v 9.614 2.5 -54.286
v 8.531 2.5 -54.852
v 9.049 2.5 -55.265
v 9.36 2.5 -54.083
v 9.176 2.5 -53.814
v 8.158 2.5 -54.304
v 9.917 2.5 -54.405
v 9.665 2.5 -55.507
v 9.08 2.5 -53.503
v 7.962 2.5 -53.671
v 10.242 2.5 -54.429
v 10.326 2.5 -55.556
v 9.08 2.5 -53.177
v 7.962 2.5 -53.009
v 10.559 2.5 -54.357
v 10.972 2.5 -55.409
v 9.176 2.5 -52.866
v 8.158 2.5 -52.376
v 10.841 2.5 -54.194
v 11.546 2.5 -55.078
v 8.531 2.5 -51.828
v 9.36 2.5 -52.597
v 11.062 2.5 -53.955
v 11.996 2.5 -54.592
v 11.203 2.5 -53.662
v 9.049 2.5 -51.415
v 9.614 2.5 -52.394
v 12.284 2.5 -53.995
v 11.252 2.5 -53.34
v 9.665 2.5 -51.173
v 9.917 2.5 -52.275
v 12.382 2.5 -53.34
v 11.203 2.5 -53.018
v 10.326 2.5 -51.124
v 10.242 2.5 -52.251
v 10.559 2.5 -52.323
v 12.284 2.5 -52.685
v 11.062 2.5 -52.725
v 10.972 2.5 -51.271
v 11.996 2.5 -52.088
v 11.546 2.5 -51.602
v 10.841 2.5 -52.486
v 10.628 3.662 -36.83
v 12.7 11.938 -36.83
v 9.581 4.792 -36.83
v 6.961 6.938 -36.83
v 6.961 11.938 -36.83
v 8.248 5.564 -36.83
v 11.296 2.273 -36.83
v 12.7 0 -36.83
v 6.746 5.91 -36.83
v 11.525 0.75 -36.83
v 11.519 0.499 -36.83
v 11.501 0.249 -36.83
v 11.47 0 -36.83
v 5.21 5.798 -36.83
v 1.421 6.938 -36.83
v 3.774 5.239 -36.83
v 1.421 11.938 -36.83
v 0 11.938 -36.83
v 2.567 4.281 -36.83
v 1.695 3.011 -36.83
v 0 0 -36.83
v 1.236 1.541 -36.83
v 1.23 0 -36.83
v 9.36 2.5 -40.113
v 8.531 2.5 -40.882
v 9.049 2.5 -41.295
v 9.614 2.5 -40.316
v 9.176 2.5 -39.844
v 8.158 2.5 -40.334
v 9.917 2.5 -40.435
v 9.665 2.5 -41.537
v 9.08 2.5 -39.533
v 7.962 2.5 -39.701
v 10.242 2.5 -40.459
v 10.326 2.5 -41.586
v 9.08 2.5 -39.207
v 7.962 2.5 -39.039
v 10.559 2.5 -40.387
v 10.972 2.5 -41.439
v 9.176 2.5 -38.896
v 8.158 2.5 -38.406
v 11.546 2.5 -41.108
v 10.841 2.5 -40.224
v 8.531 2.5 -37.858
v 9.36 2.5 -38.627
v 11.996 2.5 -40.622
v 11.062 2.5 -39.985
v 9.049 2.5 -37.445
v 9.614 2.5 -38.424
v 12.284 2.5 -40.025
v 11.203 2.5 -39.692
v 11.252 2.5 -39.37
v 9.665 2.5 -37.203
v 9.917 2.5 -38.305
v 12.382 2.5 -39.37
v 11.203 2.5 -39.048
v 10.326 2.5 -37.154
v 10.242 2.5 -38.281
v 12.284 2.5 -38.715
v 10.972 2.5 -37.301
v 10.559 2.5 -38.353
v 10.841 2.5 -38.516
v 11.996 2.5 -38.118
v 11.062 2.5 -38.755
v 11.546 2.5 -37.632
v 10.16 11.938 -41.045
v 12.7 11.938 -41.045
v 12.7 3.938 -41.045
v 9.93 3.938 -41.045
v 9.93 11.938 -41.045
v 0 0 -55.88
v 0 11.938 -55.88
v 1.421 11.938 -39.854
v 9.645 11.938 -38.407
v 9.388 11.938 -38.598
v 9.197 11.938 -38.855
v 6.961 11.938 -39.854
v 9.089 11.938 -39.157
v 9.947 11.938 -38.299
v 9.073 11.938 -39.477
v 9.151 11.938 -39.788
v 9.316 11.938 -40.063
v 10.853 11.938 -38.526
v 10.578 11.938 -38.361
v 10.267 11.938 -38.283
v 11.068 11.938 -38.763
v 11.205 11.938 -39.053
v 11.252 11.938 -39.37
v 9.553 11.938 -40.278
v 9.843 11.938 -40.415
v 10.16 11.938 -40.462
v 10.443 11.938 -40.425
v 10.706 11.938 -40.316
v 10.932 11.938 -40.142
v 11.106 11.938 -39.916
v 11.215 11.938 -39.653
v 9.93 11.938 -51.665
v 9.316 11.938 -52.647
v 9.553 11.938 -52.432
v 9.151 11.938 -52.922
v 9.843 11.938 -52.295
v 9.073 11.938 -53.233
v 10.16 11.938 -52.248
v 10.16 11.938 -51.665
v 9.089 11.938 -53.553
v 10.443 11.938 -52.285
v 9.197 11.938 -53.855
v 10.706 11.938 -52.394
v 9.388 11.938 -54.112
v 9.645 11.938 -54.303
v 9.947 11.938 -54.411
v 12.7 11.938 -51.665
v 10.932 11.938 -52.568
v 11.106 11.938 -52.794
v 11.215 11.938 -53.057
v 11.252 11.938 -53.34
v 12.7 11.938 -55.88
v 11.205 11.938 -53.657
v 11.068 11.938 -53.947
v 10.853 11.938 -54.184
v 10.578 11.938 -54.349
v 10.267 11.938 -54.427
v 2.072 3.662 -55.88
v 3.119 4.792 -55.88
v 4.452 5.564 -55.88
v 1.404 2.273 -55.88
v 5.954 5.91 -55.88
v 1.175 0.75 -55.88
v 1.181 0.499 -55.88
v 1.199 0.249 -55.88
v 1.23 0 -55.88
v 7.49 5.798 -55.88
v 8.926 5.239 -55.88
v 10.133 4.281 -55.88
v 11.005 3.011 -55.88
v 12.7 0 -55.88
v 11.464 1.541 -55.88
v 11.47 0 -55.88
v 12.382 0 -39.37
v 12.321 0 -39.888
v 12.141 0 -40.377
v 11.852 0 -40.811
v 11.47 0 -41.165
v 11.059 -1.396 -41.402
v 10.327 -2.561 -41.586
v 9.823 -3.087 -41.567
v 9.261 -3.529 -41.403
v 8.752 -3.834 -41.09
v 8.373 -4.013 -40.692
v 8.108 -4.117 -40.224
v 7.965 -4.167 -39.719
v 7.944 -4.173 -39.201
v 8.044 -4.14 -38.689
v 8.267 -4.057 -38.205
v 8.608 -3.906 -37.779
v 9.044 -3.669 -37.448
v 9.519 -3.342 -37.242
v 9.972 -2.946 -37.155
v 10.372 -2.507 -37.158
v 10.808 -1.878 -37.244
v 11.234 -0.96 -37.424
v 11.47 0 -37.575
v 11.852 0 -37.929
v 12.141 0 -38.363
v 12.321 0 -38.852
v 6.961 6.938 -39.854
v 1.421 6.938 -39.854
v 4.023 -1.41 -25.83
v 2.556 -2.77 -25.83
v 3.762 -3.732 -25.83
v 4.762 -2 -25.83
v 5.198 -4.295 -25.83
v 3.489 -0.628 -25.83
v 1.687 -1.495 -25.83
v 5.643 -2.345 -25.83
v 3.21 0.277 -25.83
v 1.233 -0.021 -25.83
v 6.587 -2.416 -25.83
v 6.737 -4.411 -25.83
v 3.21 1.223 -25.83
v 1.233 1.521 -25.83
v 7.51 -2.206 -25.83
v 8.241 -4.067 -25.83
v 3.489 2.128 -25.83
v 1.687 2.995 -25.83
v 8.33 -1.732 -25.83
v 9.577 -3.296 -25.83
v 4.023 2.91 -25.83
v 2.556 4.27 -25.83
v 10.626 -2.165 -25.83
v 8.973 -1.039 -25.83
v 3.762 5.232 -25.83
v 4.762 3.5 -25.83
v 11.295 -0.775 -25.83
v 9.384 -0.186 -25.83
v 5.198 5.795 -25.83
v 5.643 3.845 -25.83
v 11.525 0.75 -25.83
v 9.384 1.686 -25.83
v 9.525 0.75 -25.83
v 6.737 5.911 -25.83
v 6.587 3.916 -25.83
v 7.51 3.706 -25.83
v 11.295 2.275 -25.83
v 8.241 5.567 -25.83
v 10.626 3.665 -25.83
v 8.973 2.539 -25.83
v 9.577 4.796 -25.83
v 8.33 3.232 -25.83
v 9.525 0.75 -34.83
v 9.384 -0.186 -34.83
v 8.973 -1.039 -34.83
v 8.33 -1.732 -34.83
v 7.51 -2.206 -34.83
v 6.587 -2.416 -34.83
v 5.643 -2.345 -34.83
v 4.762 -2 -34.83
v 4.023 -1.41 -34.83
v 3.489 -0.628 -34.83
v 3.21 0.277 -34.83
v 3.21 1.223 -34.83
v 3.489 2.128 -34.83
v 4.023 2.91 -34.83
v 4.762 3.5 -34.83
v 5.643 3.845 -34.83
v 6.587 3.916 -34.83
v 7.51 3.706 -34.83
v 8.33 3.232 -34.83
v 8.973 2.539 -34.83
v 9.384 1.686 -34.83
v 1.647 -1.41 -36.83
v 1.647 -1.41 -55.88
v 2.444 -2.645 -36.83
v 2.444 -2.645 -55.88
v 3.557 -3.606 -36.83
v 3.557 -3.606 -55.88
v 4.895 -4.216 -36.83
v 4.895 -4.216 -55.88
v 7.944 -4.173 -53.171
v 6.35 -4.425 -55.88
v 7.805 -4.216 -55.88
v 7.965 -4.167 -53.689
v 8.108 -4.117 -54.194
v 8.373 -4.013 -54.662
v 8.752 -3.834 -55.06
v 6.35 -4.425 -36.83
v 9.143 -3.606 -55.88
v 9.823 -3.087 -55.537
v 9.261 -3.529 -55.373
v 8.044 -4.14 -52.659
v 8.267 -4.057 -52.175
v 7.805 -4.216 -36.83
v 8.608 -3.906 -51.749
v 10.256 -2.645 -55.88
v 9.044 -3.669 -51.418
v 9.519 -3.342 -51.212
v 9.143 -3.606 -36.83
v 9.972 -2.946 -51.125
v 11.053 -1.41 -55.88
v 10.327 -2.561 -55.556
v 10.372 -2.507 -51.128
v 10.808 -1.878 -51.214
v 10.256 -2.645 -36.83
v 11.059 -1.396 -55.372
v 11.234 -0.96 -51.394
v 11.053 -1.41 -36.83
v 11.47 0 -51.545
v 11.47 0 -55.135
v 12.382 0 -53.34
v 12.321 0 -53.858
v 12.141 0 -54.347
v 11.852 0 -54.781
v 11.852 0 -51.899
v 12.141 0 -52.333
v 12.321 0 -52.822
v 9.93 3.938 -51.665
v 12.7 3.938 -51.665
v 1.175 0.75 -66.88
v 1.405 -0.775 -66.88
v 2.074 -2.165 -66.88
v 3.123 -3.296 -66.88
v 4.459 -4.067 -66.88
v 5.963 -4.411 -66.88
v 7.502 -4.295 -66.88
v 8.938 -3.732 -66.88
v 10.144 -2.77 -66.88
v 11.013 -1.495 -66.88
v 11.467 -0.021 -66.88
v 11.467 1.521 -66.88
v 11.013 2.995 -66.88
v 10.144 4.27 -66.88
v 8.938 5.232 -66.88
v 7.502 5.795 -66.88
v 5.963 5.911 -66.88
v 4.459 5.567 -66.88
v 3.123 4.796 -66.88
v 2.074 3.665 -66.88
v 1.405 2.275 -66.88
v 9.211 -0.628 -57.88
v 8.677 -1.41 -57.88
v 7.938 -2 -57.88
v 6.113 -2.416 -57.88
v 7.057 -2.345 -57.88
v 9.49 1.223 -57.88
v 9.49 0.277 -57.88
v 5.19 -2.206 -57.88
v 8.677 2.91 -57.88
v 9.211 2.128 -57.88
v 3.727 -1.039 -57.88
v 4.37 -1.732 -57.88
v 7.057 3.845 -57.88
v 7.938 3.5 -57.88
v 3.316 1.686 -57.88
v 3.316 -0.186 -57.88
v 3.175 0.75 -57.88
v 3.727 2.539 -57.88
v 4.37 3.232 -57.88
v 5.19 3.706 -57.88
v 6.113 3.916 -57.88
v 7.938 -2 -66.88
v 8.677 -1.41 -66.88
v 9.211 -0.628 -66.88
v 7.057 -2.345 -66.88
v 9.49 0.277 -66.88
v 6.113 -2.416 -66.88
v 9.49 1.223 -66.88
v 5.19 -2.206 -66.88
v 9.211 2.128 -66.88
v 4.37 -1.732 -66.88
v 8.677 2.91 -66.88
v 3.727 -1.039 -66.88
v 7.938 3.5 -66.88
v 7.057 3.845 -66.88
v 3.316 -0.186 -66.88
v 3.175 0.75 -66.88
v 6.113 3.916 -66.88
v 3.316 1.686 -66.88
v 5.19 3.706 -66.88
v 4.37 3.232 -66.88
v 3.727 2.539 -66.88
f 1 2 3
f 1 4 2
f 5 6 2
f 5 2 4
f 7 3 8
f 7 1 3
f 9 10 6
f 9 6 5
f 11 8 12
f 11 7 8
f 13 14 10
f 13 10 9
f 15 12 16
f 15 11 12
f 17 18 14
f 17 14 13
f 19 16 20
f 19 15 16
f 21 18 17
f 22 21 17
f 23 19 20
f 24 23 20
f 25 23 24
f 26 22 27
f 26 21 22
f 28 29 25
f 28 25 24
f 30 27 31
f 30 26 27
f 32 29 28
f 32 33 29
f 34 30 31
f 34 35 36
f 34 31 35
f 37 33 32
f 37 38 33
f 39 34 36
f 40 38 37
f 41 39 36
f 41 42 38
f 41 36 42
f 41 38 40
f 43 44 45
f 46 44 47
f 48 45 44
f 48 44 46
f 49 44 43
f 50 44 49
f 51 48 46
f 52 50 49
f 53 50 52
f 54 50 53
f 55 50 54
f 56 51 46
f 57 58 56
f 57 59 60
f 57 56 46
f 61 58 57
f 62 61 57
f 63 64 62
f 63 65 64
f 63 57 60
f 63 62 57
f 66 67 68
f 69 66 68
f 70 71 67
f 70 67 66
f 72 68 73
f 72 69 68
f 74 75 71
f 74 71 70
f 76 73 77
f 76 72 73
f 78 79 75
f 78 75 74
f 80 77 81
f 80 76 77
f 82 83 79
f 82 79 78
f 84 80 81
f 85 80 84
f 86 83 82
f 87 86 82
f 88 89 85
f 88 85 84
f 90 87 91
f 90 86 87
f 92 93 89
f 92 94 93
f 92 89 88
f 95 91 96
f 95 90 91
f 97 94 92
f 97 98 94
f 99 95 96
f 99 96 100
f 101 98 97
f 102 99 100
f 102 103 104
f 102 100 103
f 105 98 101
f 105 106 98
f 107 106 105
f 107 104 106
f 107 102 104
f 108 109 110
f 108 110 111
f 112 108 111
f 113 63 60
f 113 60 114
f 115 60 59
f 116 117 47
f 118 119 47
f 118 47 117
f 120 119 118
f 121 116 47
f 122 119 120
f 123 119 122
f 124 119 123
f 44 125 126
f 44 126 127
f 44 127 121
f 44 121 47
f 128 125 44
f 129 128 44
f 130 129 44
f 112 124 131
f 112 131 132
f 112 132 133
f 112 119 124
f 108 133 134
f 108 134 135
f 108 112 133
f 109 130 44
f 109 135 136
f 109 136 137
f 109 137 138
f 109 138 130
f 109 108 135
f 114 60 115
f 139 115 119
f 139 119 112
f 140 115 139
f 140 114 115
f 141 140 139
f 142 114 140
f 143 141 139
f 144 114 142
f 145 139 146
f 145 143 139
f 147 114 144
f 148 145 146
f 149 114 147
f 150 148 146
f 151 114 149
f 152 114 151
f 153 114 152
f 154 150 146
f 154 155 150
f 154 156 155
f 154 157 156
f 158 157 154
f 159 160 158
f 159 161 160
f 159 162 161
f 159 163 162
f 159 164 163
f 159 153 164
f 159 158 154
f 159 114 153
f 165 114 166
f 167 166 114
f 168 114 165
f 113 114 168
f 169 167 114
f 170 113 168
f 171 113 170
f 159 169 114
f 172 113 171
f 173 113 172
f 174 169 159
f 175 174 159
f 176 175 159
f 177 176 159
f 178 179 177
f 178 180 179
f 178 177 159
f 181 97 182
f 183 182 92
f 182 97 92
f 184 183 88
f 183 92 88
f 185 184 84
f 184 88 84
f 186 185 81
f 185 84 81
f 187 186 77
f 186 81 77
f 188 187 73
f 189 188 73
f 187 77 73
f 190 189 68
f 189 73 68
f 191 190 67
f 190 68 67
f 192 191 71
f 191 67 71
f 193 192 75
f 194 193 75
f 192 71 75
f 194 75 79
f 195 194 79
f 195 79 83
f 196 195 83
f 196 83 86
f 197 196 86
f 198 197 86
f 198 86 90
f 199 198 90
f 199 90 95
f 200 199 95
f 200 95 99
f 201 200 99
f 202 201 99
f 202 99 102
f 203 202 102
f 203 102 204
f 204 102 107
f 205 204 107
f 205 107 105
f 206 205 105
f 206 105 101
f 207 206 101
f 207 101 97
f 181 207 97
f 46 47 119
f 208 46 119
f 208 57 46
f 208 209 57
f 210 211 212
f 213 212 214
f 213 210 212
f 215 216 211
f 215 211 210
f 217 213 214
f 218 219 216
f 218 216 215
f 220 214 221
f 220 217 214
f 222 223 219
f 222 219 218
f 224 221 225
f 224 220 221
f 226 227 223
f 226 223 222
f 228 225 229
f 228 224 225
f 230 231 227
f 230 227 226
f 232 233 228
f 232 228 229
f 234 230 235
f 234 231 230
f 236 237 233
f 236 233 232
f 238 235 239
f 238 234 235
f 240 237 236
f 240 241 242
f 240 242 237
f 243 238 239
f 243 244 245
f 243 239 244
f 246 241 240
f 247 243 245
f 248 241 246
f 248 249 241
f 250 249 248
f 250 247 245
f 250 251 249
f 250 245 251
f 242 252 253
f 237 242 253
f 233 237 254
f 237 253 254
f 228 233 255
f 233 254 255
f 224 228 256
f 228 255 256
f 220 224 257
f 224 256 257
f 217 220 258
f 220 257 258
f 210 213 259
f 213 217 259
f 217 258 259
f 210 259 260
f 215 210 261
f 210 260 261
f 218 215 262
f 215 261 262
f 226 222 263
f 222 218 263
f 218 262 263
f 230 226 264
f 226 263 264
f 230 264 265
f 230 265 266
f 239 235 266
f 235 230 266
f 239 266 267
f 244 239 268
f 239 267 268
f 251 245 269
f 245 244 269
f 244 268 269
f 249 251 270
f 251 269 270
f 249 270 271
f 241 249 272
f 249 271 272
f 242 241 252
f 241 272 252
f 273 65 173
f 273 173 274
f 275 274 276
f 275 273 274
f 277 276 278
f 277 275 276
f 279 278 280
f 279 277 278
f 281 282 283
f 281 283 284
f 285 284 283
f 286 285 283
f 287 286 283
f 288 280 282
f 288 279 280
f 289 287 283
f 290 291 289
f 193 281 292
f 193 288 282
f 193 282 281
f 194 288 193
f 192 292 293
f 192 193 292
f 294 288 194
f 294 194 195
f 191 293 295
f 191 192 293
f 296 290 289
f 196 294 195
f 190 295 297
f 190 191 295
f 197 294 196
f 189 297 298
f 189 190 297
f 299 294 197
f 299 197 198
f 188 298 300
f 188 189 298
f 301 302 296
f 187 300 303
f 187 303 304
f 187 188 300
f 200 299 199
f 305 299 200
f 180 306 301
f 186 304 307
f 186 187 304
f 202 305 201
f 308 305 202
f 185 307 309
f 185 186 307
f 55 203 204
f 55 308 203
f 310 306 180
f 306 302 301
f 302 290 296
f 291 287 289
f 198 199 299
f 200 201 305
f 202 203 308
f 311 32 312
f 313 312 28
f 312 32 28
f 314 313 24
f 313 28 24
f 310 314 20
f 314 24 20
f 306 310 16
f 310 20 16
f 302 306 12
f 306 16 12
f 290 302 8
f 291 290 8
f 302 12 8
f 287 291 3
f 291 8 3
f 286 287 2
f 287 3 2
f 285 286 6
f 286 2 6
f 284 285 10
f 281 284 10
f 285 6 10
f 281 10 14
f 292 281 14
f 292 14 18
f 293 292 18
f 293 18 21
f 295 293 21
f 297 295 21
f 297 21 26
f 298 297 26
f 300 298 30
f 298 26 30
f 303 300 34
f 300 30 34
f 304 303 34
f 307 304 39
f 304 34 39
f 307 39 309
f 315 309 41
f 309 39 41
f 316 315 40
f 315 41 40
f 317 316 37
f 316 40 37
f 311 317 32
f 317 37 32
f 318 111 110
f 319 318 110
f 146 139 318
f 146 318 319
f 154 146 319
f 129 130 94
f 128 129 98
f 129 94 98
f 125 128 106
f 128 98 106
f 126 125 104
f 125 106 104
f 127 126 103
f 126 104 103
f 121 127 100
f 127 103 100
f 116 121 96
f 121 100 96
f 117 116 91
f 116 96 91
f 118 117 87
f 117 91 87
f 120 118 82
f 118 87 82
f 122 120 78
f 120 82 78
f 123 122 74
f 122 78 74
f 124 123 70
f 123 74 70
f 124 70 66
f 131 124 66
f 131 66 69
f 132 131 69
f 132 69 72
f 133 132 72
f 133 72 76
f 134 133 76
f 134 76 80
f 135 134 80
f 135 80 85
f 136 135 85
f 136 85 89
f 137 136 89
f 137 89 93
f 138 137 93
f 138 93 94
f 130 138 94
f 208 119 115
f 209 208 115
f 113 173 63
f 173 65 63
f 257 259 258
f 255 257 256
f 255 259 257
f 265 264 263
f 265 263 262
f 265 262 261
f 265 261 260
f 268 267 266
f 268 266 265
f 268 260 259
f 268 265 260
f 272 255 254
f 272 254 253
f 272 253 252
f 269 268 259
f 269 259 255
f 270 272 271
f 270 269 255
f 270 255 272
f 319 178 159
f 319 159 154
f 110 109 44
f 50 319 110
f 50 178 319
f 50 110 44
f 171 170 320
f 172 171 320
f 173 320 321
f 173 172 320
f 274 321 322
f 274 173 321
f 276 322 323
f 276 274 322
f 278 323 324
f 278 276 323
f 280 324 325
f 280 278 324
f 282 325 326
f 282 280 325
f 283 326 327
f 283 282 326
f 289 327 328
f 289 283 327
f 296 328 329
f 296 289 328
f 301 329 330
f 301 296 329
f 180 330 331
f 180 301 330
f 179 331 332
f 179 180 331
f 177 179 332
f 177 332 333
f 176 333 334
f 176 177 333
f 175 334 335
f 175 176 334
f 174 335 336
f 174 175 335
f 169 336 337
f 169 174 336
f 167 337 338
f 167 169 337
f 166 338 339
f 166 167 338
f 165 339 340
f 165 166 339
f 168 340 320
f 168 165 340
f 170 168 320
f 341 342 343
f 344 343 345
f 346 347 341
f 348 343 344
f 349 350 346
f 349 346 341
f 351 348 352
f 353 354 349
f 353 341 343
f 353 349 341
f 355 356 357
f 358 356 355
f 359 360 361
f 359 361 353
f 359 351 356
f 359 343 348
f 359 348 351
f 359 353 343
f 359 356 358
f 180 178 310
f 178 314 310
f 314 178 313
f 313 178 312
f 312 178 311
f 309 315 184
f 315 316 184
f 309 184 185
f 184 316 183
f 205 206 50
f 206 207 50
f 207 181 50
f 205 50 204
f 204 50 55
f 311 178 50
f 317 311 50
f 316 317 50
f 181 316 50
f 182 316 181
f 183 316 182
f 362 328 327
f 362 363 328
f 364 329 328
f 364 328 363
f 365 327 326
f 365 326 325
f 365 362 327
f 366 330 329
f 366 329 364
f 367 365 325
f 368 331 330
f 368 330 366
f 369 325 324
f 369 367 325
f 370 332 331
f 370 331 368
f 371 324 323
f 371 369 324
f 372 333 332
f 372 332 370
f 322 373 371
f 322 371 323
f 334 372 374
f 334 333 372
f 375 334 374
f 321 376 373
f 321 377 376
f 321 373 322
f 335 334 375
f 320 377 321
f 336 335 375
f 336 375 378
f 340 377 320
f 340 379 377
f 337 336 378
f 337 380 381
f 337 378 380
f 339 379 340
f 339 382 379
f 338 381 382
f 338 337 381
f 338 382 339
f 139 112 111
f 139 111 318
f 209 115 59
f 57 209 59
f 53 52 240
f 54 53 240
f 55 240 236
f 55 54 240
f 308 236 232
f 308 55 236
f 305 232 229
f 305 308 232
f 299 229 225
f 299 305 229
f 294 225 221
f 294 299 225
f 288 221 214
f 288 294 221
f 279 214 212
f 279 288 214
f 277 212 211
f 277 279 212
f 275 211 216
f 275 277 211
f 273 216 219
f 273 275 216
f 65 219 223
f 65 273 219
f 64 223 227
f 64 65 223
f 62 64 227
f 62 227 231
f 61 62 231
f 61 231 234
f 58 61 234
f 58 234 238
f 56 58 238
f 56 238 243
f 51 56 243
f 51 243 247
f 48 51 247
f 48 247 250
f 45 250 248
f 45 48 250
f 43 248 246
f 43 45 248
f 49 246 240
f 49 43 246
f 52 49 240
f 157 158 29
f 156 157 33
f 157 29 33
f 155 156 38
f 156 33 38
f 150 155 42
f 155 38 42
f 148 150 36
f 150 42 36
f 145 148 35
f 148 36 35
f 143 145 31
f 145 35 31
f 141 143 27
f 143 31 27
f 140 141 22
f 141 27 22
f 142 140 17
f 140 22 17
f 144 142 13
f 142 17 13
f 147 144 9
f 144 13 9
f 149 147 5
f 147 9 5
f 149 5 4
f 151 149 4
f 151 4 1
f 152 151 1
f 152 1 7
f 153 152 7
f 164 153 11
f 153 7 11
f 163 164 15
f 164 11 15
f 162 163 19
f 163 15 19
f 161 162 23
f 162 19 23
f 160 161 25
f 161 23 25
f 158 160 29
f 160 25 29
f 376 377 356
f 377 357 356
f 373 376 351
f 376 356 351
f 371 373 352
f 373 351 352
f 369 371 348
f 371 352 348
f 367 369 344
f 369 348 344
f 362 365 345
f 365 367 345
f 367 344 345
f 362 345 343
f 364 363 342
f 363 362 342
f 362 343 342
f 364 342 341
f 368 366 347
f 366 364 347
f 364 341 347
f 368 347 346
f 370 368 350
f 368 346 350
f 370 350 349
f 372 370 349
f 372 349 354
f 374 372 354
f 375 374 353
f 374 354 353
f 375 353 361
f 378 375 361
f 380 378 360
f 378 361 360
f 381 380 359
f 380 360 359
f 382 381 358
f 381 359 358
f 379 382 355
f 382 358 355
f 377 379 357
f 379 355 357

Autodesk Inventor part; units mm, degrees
ref_plane "YZ Plane" through (0, 0, 0) normal (1, 0, 0) x (0, 1, 0)
ref_plane "XZ Plane" through (0, 0, 0) normal (0, 1, 0) x (-1, 0, 0)
ref_plane "XY Plane" through (0, 0, 0) normal (0, 0, 1) x (1, 0, 0)
sketch "Sketch1" plane through (0, 0, 0) normal (0, 1, 0) x (-1, 0, 0)
  line L0 (0, -55.88) -> (-12.7, -55.88)
  line L1 (-12.7, -36.83) -> (0, -36.83)
  line L2 (0, -36.83) -> (0, -55.88)
  line L3 (-12.7, -55.88) -> (-12.7, -36.83)
  dimension "d1" = 19.05
  dimension "d2" = 12.7
extrude "Extrusion1" add sketch "Sketch1" along normal blind 1.5
sketch "Sketch2" plane through (0, 1.5, 0) normal (0, 1, 0) x (1, 0, 0)
  line L0 (12.7, 36.83) -> (12.7, 55.88) projected
  line L1 (12.7, 0) -> (10.16, 0)
  circle A0 centre (10.16, 39.37) radius 1.092
  circle A1 centre (10.16, 53.34) radius 1.092
  line L2 (10.16, 53.34) -> (10.16, 39.37)
  point P0 (0, 0)
  dimension "d8" = 2.184
  dimension "d10" = 2.184
  dimension "d71" = 13.97
extrude "Extrusion2" cut sketch "Sketch2" against normal blind 1.5
sketch "Sketch5" plane through (0, 0, -36.83) normal (0, 0, 1) x (1, 0, 0)
  line L0 (12.7, 0) -> (0, 0) projected
  line L1 (6.35, 0) -> (6.35, 1.5)
  line L2 (12.7, 1.5) -> (0, 1.5) projected
  line L3 (0, 0) -> (0, 1.5) projected
  line L4 (0, 0.75) -> (12.7, 0.75)
  line L5 (12.7, 0) -> (12.7, 1.5) projected
  circle A0 centre (6.35, 0.75) radius 5.175
  dimension "d30" = 10.35
extrude "Extrusion5" add sketch "Sketch5" along normal blind 2 contours A0 L0 | L0 L1 L4 A0 | L0 A0 L4 L1 | L4 L1 L2 A0 | L4 A0 L2 L1 | L2 A0
sketch "Sketch6" plane through (6.35, 0.75, -34.83) normal (0, 0, 1) x (1, 0, 0)
  circle A0 centre (0, 0) radius 5.175
  circle A1 centre (0, 0) radius 3.175
  point P0 (-6.35, -0.75)
  dimension "d35" = 6.35
extrude "Extrusion6" add sketch "Sketch6" along normal blind 9
sketch "Sketch7" plane through (12.7, 0, -55.88) normal (0, 0, -1) x (-1, 0, 0)
  line L0 (0, 0) -> (0, 1.5) projected
  line L1 (0, 0.75) -> (12.7, 0.75)
  line L2 (12.7, 0) -> (12.7, 1.5) projected
  line L3 (11.4704, 1.5) -> (1.2296, 1.5) projected
  line L4 (6.35, 1.5) -> (6.35, 0)
  circle A0 centre (6.35, 0.75) radius 5.175
extrude "Extrusion7" add sketch "Sketch7" along normal blind 2
sketch "Sketch8" plane through (6.35, 0.75, -57.88) normal (0, 0, -1) x (-1, 0, 0)
  circle A0 centre (0, 0) radius 5.175
  circle A1 centre (0, 0) radius 3.175
  point P0 (6.35, -0.75)
  dimension "d40" = 6.35
extrude "Extrusion8" add sketch "Sketch8" along normal blind 9
thread "Thread1" size "1/4-20 UNC" class "2B" standard "ANSI Unified Screw Threads" full length
thread "Thread2" size "1/4-20 UNC" class "2B" standard "ANSI Unified Screw Threads" full length
sketch "Sketch9" plane through (0, 0, -36.83) normal (0, 0, -1) x (-1, 0, 0)
  arc A0 (-11.4704, 0) -> (-1.2296, 0) centre (-6.35, 0.75) ccw projected
  line L0 (0, 0) -> (-1.2296, 0) projected
  line L1 (-11.4704, 0) -> (-1.2296, 0)
  circle A1 centre (-6.35, 0.75) radius 5.175
extrude "Extrusion9" add sketch "Sketch9" along normal up to next contours L1 A0
sketch "Sketch10" plane through (10.16, 0, -39.37) normal (0, 1, 0) x (1, 0, 0)
  circle A0 centre (0, 0) radius 1.092
  circle A1 centre (0, 13.97) radius 1.092 projected
  circle A2 centre (0, 13.97) radius 1.092
  point P0 (-10.16, -39.37)
  dimension "d60" = 2.184
extrude "Extrusion10" cut sketch "Sketch10" against normal up to next
sketch "Sketch12" plane through (0, 1.5, 0) normal (0, 1, 0) x (1, 0, 0)
  circle A0 centre (10.16, 39.37) radius 1.092 projected
  circle A1 centre (10.16, 39.37) radius 1.092
  circle A2 centre (10.16, 39.37) radius 2.2225
  circle A3 centre (10.16, 53.34) radius 1.092 projected
  circle A4 centre (10.16, 53.34) radius 1.092
  circle A5 centre (10.16, 53.34) radius 2.2225
  point P0 (0, 0)
  dimension "d54" = 4.445
  dimension "d55" = 4.445
extrude "Extrusion11" cut sketch "Sketch12" against normal blind 5.925
sketch "Sketch13" plane through (0, 1.5, 0) normal (0, 1, 0) x (1, 0, 0)
  line L0 (12.7, 36.83) -> (12.7, 55.88) projected
  line L1 (12.7, 55.88) -> (0, 55.88)
  line L2 (0, 55.88) -> (0, 36.83)
  line L3 (12.7, 36.83) -> (12.7, 55.88)
  circle A0 centre (10.16, 53.34) radius 1.092 projected
  circle A1 centre (10.16, 53.34) radius 1.092
  line L4 (10.16, 53.34) -> (10.16, 39.37)
  circle A2 centre (10.16, 39.37) radius 1.092
  line L5 (0, 36.83) -> (12.7, 36.83)
  point P0 (0, 0)
  point P1 (12.7, 0)
  dimension "d72" = 13.97
  dimension "d73" = 2.184
extrude "Extrusion12" add sketch "Sketch13" along normal blind 10.4375 contours L5 L2 L1 L0 | A2
thread "Thread6" size "2-56 UNC" class "2B" standard "ANSI Unified Screw Threads" full length
sketch "Sketch14" plane through (10.16, 1.5, -53.34) normal (0, -1, 0) x (1, 0, 0)
  circle A0 centre (0, 0) radius 1.092 projected
  circle A1 centre (0, 0) radius 2.2225
  circle A2 centre (0, 13.97) radius 2.2225 projected
  circle A3 centre (0, 13.97) radius 2.2225
  circle A4 centre (0, 0) radius 1.092
  circle A5 centre (0, 13.97) radius 1.092
  point P0 (-10.16, 53.34)
extrude "Extrusion13" cut sketch "Sketch14" against normal blind 1
sketch "Sketch15" plane through (10.16, 1.5, -39.37) normal (0, -1, 0) x (1, 0, 0)
  circle A0 centre (0, 0) radius 1.092
  point P0 (-10.16, 39.37)
extrude "Extrusion14" cut sketch "Sketch15" against normal through all
thread "Thread7" size "2-56 UNC" class "2B" standard "ANSI Unified Screw Threads" full length
sketch "Sketch16" plane through (0, 11.9375, 0) normal (0, 1, 0) x (1, 0, 0)
  line L0 (11.525, 36.83) -> (1.175, 36.83) projected
  line L1 (3.175, 34.83) -> (9.525, 34.83) projected
  line L2 (1.921, 36.83) -> (6.461, 36.83)
  line L3 (6.461, 36.83) -> (6.961, 36.83)
  line L4 (6.961, 36.83) -> (6.961, 39.854)
  line L5 (6.961, 39.854) -> (1.421, 39.854)
  line L6 (1.421, 39.854) -> (1.421, 36.83)
  line L7 (1.421, 36.83) -> (1.921, 36.83)
  point P0 (0, 0)
  point P1 (0, 36.83)
  point P2 (1.2296, 36.83)
  point P3 (11.4704, 36.83)
  dimension "d114" = 0.5
  dimension "d115" = 3.024
  dimension "d116" = 5.54
extrude "Extrusion15" cut sketch "Sketch16" against normal blind 5
sketch "Sketch17" plane through (0, 11.9375, 0) normal (0, 1, 0) x (1, 0, 0)
  line L0 (12.7, 36.83) -> (12.7, 55.88) projected
  line L1 (12.7, 55.88) -> (0, 55.88) projected
  line L2 (0, 36.83) -> (12.7, 36.83) projected
  line L3 (0, 36.83) -> (12.7, 36.83)
  line L4 (12.7, 36.83) -> (12.7, 55.88)
  line L5 (12.7, 55.88) -> (0, 55.88)
  line L6 (0, 55.88) -> (0, 36.83)
  line L7 (11.4704, 41.1651) -> (11.4704, 51.5449) projected
  line L8 (11.43, 42.545) -> (12.43, 42.545) construction
  line L9 (11.43, 50.165) -> (12.43, 50.165) construction
  line L10 (12.7, 41.545) -> (12.7, 51.165)
  line L11 (12.7, 41.545) -> (12.7, 41.045)
  line L12 (12.7, 41.045) -> (9.93, 41.045)
  line L13 (9.93, 41.045) -> (9.93, 51.665)
  line L14 (9.93, 51.665) -> (12.7, 51.665)
  line L15 (12.7, 51.165) -> (12.7, 51.665)
  point P0 (0, 0)
  dimension "d110" = 2.77
  dimension "d111" = 10.62
  dimension "d112" = 90
extrude "Extrusion16" cut sketch "Sketch17" against normal blind 8 contours L12 L13 L14 L0
properties part number "Line Sensor 6 Bracket"
